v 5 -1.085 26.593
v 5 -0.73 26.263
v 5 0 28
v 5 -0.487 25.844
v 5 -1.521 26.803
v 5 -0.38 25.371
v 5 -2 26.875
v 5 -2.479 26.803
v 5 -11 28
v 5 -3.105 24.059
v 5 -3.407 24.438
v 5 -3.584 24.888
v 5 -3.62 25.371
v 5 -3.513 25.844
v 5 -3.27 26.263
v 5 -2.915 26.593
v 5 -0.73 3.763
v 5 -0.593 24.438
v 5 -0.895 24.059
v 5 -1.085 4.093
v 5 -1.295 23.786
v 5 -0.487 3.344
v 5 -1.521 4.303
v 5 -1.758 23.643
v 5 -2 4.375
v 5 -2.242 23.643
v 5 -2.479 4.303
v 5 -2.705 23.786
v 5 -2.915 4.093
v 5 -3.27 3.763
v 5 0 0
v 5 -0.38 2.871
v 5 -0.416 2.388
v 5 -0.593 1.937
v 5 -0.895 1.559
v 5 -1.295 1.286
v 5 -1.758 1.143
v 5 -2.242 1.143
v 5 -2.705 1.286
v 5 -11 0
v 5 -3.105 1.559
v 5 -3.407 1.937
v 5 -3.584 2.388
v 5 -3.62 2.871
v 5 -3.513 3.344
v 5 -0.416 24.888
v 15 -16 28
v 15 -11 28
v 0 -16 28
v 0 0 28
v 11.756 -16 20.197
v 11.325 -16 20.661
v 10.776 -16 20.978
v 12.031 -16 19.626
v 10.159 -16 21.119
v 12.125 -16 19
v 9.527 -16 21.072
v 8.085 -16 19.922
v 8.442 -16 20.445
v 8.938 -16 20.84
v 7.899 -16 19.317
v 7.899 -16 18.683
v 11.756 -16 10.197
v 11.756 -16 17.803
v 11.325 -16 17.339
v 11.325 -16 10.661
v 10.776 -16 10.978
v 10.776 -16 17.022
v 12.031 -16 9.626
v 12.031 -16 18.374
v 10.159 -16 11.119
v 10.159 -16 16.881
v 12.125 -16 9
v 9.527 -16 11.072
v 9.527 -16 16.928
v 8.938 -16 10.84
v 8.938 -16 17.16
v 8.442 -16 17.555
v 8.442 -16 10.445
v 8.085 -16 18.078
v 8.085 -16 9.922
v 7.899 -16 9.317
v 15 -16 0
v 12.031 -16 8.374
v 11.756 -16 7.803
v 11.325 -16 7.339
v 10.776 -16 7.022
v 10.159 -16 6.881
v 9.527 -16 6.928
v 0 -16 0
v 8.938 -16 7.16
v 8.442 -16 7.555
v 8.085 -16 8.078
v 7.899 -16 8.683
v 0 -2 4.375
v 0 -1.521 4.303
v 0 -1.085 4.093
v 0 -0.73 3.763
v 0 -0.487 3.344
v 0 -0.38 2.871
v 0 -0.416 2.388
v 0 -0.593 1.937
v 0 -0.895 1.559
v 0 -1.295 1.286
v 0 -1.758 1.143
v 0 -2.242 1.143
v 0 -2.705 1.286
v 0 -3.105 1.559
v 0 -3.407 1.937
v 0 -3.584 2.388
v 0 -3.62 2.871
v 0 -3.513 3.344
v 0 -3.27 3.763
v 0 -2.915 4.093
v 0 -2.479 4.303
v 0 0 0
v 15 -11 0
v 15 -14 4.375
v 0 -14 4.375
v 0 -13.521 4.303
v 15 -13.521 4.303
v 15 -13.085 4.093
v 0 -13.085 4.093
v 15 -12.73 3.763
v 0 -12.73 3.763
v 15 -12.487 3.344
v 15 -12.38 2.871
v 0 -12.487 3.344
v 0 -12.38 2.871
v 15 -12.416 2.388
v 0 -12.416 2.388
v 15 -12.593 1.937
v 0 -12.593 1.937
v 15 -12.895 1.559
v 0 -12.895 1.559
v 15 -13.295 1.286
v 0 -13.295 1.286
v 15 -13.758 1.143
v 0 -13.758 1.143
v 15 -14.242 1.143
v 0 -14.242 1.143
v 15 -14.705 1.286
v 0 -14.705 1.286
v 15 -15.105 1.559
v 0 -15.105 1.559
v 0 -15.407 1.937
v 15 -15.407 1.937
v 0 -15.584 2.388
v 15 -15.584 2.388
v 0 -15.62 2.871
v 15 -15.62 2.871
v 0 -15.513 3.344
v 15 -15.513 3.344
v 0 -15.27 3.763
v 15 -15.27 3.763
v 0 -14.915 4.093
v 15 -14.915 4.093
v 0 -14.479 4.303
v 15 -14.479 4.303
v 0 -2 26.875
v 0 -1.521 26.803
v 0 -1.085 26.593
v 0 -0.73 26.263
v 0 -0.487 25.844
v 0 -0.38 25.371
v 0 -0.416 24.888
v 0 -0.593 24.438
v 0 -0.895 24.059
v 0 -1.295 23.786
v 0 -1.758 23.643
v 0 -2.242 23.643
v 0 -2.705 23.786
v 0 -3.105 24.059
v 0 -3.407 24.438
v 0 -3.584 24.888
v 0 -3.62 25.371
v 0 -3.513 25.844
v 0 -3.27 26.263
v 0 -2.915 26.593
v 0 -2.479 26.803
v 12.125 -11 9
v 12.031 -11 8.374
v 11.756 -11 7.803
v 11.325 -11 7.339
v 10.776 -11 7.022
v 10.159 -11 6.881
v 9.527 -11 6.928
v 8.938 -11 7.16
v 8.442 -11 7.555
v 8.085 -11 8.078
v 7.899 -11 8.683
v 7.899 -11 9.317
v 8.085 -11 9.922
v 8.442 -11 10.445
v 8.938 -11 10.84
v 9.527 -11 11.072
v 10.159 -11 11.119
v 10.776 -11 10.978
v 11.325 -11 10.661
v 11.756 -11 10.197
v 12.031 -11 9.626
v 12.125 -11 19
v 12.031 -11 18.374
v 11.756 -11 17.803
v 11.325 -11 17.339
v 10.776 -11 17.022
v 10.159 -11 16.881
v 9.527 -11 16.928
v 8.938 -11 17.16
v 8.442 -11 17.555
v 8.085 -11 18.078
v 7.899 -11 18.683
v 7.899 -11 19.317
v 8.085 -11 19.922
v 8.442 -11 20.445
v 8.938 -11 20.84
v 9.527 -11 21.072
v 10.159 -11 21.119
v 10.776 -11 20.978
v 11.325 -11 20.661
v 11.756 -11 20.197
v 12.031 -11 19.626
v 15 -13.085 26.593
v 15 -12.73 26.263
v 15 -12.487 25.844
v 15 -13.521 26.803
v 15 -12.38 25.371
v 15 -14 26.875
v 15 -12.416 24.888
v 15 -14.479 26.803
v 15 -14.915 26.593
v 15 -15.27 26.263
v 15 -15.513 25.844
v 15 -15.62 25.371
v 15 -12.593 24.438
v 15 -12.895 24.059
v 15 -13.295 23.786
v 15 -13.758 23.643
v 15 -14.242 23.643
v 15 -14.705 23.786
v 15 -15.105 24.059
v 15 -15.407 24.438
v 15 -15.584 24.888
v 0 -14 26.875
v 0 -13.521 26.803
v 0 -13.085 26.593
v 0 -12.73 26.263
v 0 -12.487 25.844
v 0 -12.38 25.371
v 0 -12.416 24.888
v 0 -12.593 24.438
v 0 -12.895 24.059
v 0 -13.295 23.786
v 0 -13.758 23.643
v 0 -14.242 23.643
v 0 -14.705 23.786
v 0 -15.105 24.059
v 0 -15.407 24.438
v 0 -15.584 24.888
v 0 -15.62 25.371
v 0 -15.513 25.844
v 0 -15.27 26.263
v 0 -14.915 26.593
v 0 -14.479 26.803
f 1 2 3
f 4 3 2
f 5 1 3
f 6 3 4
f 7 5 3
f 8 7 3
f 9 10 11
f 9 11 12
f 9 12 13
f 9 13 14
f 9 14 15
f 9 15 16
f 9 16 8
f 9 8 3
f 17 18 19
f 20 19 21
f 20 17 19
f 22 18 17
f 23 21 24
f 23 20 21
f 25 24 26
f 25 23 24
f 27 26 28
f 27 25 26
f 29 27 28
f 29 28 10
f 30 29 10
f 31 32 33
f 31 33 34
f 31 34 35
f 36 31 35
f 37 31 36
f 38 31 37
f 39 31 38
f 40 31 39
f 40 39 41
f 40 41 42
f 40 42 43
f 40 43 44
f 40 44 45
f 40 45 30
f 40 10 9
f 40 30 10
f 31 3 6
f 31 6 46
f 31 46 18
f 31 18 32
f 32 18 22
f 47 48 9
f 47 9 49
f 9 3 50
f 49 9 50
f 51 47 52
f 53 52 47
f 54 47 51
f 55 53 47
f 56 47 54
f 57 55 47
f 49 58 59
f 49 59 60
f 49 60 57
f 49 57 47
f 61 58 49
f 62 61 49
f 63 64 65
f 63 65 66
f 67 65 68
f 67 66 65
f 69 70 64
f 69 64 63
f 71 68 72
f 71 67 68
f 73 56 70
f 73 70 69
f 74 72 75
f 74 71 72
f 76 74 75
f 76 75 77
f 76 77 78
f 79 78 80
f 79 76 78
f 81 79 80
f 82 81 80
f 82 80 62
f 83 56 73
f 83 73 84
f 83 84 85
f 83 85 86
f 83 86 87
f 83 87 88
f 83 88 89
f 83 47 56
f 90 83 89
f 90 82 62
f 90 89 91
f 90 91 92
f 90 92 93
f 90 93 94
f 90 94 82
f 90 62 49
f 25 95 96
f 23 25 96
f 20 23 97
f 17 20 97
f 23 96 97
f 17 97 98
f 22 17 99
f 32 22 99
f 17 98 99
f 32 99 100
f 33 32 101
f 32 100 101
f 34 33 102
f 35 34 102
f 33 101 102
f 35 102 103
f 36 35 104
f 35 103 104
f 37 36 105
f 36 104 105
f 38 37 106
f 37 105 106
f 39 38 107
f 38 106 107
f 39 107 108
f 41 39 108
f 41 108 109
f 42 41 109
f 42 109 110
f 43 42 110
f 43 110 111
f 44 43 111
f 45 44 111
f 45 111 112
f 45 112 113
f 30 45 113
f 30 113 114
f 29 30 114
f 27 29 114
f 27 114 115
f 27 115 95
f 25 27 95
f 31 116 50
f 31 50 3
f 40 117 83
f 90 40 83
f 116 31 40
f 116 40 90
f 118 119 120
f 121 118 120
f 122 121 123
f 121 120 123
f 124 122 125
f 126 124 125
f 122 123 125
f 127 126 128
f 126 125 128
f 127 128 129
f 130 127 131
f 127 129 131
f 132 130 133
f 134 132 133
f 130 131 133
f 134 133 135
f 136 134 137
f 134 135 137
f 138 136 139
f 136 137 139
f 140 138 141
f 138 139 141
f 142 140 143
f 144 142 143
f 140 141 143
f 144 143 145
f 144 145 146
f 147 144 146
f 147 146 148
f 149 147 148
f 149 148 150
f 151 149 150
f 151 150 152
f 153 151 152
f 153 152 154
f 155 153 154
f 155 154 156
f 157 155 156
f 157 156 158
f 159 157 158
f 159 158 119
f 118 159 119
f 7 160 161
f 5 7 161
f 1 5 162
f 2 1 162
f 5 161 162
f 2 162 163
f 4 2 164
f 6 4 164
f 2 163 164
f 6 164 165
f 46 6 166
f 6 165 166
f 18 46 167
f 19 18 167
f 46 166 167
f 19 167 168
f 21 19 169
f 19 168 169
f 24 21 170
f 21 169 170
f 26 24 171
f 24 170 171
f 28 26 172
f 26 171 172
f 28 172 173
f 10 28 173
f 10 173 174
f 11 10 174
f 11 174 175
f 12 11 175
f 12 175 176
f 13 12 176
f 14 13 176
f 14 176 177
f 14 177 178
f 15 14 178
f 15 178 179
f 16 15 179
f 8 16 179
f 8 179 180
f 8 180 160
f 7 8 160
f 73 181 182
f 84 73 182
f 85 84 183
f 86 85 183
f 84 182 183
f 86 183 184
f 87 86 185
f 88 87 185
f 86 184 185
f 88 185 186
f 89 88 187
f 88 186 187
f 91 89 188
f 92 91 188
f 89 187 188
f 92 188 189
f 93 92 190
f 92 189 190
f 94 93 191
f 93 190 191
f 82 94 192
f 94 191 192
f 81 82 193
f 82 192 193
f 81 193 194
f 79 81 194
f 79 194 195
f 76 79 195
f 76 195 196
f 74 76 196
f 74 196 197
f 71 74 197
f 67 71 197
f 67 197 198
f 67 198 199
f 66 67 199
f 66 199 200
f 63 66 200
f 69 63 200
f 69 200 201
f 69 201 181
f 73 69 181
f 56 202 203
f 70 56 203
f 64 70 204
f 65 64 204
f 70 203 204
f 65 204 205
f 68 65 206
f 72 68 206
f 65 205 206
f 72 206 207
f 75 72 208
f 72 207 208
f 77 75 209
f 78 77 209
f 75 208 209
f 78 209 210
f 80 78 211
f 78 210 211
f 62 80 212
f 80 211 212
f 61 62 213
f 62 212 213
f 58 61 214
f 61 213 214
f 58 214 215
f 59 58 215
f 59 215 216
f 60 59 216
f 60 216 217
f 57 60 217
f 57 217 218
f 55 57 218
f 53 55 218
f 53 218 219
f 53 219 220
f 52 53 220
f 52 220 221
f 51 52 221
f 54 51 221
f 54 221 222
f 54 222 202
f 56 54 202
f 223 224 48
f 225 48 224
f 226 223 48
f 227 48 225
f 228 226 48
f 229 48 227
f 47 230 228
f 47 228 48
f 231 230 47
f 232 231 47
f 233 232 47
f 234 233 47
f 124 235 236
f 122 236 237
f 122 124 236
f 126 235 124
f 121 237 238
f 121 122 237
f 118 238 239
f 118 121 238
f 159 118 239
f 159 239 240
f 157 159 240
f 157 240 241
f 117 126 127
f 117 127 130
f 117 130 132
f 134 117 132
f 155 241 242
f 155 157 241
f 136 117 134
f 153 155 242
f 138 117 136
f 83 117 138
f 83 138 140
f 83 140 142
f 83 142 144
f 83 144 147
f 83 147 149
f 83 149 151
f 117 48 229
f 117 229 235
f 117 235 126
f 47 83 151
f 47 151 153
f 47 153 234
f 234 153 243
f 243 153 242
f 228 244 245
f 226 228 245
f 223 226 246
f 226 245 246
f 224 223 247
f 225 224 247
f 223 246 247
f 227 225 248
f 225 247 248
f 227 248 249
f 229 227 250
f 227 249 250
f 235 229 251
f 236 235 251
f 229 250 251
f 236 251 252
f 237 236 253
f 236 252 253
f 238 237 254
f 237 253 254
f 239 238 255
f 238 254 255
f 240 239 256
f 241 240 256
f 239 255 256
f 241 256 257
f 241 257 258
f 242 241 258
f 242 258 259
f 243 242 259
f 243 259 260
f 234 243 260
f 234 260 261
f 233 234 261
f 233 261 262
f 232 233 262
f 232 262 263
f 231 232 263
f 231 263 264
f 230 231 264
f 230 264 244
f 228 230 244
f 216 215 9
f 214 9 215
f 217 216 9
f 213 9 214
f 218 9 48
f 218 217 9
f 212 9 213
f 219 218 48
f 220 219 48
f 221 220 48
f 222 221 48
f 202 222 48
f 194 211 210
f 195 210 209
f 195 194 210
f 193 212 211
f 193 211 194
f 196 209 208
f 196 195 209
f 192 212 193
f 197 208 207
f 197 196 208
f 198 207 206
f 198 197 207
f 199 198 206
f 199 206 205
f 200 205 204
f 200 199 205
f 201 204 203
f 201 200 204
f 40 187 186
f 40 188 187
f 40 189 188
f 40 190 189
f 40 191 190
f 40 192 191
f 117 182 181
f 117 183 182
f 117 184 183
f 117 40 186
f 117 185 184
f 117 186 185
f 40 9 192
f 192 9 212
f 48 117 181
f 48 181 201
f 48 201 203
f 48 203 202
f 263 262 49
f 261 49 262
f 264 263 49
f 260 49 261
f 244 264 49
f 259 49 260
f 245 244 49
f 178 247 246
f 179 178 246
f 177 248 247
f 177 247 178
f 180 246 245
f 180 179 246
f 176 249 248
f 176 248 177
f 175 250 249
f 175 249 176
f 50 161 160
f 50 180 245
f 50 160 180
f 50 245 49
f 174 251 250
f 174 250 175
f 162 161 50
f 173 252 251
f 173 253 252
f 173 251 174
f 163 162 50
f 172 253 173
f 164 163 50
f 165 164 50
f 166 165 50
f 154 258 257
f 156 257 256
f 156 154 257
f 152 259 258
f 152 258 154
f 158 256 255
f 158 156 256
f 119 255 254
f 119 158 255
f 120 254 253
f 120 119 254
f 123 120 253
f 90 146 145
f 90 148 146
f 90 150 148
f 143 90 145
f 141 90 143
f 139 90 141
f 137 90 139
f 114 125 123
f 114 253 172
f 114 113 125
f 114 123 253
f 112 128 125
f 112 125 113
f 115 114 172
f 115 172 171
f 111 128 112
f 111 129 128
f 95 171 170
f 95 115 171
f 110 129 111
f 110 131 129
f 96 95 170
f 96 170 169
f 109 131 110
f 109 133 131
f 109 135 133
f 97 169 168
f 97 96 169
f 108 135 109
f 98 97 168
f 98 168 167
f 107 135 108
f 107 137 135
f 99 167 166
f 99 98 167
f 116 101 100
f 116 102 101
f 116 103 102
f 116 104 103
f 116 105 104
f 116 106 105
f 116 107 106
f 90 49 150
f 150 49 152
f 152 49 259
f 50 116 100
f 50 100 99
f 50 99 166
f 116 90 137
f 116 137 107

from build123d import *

# Parameters (mm, degrees)
BOSS_EXTRU_1_DEPTH      = 28
ESQUISSE3_R             = 1.625
ENL_V_MAT_EXTRU_1_DEPTH = 16
ESQUISSE4_R             = 2.125
ENL_V_MAT_EXTRU_2_DEPTH = 10


with BuildPart() as part:
    # Esquisse1 → Boss.-Extru.1 (new body)
    with BuildSketch(Plane.XY):
        Polygon((0, 0), (5, 0), (5, -11), (15, -11), (15, -16), (0, -16), align=None)
    extrude(amount=BOSS_EXTRU_1_DEPTH)

    # Esquisse3 → Enlèv. mat.-Extru.1 (cut, through all)
    with BuildSketch(Plane.ZY):
        with Locations((25.25, -2)):
            Circle(ESQUISSE3_R)
        with Locations((2.75, -14)):
            Circle(ESQUISSE3_R)
        with Locations((25.25, -14)):
            Circle(ESQUISSE3_R)
        with Locations((2.75, -2)):
            Circle(ESQUISSE3_R)
    extrude(amount=-ENL_V_MAT_EXTRU_1_DEPTH, mode=Mode.SUBTRACT)

    # Esquisse4 → Enlèv. mat.-Extru.2 (cut)
    with BuildSketch(Plane(origin=(0, -11, 0), x_dir=(1, 0, 0), z_dir=(0, 1, 0))):
        with Locations((10, -9)):
            Circle(ESQUISSE4_R)
        with Locations((10, -19)):
            Circle(ESQUISSE4_R)
    extrude(amount=-ENL_V_MAT_EXTRU_2_DEPTH, mode=Mode.SUBTRACT)


solid = part.part
